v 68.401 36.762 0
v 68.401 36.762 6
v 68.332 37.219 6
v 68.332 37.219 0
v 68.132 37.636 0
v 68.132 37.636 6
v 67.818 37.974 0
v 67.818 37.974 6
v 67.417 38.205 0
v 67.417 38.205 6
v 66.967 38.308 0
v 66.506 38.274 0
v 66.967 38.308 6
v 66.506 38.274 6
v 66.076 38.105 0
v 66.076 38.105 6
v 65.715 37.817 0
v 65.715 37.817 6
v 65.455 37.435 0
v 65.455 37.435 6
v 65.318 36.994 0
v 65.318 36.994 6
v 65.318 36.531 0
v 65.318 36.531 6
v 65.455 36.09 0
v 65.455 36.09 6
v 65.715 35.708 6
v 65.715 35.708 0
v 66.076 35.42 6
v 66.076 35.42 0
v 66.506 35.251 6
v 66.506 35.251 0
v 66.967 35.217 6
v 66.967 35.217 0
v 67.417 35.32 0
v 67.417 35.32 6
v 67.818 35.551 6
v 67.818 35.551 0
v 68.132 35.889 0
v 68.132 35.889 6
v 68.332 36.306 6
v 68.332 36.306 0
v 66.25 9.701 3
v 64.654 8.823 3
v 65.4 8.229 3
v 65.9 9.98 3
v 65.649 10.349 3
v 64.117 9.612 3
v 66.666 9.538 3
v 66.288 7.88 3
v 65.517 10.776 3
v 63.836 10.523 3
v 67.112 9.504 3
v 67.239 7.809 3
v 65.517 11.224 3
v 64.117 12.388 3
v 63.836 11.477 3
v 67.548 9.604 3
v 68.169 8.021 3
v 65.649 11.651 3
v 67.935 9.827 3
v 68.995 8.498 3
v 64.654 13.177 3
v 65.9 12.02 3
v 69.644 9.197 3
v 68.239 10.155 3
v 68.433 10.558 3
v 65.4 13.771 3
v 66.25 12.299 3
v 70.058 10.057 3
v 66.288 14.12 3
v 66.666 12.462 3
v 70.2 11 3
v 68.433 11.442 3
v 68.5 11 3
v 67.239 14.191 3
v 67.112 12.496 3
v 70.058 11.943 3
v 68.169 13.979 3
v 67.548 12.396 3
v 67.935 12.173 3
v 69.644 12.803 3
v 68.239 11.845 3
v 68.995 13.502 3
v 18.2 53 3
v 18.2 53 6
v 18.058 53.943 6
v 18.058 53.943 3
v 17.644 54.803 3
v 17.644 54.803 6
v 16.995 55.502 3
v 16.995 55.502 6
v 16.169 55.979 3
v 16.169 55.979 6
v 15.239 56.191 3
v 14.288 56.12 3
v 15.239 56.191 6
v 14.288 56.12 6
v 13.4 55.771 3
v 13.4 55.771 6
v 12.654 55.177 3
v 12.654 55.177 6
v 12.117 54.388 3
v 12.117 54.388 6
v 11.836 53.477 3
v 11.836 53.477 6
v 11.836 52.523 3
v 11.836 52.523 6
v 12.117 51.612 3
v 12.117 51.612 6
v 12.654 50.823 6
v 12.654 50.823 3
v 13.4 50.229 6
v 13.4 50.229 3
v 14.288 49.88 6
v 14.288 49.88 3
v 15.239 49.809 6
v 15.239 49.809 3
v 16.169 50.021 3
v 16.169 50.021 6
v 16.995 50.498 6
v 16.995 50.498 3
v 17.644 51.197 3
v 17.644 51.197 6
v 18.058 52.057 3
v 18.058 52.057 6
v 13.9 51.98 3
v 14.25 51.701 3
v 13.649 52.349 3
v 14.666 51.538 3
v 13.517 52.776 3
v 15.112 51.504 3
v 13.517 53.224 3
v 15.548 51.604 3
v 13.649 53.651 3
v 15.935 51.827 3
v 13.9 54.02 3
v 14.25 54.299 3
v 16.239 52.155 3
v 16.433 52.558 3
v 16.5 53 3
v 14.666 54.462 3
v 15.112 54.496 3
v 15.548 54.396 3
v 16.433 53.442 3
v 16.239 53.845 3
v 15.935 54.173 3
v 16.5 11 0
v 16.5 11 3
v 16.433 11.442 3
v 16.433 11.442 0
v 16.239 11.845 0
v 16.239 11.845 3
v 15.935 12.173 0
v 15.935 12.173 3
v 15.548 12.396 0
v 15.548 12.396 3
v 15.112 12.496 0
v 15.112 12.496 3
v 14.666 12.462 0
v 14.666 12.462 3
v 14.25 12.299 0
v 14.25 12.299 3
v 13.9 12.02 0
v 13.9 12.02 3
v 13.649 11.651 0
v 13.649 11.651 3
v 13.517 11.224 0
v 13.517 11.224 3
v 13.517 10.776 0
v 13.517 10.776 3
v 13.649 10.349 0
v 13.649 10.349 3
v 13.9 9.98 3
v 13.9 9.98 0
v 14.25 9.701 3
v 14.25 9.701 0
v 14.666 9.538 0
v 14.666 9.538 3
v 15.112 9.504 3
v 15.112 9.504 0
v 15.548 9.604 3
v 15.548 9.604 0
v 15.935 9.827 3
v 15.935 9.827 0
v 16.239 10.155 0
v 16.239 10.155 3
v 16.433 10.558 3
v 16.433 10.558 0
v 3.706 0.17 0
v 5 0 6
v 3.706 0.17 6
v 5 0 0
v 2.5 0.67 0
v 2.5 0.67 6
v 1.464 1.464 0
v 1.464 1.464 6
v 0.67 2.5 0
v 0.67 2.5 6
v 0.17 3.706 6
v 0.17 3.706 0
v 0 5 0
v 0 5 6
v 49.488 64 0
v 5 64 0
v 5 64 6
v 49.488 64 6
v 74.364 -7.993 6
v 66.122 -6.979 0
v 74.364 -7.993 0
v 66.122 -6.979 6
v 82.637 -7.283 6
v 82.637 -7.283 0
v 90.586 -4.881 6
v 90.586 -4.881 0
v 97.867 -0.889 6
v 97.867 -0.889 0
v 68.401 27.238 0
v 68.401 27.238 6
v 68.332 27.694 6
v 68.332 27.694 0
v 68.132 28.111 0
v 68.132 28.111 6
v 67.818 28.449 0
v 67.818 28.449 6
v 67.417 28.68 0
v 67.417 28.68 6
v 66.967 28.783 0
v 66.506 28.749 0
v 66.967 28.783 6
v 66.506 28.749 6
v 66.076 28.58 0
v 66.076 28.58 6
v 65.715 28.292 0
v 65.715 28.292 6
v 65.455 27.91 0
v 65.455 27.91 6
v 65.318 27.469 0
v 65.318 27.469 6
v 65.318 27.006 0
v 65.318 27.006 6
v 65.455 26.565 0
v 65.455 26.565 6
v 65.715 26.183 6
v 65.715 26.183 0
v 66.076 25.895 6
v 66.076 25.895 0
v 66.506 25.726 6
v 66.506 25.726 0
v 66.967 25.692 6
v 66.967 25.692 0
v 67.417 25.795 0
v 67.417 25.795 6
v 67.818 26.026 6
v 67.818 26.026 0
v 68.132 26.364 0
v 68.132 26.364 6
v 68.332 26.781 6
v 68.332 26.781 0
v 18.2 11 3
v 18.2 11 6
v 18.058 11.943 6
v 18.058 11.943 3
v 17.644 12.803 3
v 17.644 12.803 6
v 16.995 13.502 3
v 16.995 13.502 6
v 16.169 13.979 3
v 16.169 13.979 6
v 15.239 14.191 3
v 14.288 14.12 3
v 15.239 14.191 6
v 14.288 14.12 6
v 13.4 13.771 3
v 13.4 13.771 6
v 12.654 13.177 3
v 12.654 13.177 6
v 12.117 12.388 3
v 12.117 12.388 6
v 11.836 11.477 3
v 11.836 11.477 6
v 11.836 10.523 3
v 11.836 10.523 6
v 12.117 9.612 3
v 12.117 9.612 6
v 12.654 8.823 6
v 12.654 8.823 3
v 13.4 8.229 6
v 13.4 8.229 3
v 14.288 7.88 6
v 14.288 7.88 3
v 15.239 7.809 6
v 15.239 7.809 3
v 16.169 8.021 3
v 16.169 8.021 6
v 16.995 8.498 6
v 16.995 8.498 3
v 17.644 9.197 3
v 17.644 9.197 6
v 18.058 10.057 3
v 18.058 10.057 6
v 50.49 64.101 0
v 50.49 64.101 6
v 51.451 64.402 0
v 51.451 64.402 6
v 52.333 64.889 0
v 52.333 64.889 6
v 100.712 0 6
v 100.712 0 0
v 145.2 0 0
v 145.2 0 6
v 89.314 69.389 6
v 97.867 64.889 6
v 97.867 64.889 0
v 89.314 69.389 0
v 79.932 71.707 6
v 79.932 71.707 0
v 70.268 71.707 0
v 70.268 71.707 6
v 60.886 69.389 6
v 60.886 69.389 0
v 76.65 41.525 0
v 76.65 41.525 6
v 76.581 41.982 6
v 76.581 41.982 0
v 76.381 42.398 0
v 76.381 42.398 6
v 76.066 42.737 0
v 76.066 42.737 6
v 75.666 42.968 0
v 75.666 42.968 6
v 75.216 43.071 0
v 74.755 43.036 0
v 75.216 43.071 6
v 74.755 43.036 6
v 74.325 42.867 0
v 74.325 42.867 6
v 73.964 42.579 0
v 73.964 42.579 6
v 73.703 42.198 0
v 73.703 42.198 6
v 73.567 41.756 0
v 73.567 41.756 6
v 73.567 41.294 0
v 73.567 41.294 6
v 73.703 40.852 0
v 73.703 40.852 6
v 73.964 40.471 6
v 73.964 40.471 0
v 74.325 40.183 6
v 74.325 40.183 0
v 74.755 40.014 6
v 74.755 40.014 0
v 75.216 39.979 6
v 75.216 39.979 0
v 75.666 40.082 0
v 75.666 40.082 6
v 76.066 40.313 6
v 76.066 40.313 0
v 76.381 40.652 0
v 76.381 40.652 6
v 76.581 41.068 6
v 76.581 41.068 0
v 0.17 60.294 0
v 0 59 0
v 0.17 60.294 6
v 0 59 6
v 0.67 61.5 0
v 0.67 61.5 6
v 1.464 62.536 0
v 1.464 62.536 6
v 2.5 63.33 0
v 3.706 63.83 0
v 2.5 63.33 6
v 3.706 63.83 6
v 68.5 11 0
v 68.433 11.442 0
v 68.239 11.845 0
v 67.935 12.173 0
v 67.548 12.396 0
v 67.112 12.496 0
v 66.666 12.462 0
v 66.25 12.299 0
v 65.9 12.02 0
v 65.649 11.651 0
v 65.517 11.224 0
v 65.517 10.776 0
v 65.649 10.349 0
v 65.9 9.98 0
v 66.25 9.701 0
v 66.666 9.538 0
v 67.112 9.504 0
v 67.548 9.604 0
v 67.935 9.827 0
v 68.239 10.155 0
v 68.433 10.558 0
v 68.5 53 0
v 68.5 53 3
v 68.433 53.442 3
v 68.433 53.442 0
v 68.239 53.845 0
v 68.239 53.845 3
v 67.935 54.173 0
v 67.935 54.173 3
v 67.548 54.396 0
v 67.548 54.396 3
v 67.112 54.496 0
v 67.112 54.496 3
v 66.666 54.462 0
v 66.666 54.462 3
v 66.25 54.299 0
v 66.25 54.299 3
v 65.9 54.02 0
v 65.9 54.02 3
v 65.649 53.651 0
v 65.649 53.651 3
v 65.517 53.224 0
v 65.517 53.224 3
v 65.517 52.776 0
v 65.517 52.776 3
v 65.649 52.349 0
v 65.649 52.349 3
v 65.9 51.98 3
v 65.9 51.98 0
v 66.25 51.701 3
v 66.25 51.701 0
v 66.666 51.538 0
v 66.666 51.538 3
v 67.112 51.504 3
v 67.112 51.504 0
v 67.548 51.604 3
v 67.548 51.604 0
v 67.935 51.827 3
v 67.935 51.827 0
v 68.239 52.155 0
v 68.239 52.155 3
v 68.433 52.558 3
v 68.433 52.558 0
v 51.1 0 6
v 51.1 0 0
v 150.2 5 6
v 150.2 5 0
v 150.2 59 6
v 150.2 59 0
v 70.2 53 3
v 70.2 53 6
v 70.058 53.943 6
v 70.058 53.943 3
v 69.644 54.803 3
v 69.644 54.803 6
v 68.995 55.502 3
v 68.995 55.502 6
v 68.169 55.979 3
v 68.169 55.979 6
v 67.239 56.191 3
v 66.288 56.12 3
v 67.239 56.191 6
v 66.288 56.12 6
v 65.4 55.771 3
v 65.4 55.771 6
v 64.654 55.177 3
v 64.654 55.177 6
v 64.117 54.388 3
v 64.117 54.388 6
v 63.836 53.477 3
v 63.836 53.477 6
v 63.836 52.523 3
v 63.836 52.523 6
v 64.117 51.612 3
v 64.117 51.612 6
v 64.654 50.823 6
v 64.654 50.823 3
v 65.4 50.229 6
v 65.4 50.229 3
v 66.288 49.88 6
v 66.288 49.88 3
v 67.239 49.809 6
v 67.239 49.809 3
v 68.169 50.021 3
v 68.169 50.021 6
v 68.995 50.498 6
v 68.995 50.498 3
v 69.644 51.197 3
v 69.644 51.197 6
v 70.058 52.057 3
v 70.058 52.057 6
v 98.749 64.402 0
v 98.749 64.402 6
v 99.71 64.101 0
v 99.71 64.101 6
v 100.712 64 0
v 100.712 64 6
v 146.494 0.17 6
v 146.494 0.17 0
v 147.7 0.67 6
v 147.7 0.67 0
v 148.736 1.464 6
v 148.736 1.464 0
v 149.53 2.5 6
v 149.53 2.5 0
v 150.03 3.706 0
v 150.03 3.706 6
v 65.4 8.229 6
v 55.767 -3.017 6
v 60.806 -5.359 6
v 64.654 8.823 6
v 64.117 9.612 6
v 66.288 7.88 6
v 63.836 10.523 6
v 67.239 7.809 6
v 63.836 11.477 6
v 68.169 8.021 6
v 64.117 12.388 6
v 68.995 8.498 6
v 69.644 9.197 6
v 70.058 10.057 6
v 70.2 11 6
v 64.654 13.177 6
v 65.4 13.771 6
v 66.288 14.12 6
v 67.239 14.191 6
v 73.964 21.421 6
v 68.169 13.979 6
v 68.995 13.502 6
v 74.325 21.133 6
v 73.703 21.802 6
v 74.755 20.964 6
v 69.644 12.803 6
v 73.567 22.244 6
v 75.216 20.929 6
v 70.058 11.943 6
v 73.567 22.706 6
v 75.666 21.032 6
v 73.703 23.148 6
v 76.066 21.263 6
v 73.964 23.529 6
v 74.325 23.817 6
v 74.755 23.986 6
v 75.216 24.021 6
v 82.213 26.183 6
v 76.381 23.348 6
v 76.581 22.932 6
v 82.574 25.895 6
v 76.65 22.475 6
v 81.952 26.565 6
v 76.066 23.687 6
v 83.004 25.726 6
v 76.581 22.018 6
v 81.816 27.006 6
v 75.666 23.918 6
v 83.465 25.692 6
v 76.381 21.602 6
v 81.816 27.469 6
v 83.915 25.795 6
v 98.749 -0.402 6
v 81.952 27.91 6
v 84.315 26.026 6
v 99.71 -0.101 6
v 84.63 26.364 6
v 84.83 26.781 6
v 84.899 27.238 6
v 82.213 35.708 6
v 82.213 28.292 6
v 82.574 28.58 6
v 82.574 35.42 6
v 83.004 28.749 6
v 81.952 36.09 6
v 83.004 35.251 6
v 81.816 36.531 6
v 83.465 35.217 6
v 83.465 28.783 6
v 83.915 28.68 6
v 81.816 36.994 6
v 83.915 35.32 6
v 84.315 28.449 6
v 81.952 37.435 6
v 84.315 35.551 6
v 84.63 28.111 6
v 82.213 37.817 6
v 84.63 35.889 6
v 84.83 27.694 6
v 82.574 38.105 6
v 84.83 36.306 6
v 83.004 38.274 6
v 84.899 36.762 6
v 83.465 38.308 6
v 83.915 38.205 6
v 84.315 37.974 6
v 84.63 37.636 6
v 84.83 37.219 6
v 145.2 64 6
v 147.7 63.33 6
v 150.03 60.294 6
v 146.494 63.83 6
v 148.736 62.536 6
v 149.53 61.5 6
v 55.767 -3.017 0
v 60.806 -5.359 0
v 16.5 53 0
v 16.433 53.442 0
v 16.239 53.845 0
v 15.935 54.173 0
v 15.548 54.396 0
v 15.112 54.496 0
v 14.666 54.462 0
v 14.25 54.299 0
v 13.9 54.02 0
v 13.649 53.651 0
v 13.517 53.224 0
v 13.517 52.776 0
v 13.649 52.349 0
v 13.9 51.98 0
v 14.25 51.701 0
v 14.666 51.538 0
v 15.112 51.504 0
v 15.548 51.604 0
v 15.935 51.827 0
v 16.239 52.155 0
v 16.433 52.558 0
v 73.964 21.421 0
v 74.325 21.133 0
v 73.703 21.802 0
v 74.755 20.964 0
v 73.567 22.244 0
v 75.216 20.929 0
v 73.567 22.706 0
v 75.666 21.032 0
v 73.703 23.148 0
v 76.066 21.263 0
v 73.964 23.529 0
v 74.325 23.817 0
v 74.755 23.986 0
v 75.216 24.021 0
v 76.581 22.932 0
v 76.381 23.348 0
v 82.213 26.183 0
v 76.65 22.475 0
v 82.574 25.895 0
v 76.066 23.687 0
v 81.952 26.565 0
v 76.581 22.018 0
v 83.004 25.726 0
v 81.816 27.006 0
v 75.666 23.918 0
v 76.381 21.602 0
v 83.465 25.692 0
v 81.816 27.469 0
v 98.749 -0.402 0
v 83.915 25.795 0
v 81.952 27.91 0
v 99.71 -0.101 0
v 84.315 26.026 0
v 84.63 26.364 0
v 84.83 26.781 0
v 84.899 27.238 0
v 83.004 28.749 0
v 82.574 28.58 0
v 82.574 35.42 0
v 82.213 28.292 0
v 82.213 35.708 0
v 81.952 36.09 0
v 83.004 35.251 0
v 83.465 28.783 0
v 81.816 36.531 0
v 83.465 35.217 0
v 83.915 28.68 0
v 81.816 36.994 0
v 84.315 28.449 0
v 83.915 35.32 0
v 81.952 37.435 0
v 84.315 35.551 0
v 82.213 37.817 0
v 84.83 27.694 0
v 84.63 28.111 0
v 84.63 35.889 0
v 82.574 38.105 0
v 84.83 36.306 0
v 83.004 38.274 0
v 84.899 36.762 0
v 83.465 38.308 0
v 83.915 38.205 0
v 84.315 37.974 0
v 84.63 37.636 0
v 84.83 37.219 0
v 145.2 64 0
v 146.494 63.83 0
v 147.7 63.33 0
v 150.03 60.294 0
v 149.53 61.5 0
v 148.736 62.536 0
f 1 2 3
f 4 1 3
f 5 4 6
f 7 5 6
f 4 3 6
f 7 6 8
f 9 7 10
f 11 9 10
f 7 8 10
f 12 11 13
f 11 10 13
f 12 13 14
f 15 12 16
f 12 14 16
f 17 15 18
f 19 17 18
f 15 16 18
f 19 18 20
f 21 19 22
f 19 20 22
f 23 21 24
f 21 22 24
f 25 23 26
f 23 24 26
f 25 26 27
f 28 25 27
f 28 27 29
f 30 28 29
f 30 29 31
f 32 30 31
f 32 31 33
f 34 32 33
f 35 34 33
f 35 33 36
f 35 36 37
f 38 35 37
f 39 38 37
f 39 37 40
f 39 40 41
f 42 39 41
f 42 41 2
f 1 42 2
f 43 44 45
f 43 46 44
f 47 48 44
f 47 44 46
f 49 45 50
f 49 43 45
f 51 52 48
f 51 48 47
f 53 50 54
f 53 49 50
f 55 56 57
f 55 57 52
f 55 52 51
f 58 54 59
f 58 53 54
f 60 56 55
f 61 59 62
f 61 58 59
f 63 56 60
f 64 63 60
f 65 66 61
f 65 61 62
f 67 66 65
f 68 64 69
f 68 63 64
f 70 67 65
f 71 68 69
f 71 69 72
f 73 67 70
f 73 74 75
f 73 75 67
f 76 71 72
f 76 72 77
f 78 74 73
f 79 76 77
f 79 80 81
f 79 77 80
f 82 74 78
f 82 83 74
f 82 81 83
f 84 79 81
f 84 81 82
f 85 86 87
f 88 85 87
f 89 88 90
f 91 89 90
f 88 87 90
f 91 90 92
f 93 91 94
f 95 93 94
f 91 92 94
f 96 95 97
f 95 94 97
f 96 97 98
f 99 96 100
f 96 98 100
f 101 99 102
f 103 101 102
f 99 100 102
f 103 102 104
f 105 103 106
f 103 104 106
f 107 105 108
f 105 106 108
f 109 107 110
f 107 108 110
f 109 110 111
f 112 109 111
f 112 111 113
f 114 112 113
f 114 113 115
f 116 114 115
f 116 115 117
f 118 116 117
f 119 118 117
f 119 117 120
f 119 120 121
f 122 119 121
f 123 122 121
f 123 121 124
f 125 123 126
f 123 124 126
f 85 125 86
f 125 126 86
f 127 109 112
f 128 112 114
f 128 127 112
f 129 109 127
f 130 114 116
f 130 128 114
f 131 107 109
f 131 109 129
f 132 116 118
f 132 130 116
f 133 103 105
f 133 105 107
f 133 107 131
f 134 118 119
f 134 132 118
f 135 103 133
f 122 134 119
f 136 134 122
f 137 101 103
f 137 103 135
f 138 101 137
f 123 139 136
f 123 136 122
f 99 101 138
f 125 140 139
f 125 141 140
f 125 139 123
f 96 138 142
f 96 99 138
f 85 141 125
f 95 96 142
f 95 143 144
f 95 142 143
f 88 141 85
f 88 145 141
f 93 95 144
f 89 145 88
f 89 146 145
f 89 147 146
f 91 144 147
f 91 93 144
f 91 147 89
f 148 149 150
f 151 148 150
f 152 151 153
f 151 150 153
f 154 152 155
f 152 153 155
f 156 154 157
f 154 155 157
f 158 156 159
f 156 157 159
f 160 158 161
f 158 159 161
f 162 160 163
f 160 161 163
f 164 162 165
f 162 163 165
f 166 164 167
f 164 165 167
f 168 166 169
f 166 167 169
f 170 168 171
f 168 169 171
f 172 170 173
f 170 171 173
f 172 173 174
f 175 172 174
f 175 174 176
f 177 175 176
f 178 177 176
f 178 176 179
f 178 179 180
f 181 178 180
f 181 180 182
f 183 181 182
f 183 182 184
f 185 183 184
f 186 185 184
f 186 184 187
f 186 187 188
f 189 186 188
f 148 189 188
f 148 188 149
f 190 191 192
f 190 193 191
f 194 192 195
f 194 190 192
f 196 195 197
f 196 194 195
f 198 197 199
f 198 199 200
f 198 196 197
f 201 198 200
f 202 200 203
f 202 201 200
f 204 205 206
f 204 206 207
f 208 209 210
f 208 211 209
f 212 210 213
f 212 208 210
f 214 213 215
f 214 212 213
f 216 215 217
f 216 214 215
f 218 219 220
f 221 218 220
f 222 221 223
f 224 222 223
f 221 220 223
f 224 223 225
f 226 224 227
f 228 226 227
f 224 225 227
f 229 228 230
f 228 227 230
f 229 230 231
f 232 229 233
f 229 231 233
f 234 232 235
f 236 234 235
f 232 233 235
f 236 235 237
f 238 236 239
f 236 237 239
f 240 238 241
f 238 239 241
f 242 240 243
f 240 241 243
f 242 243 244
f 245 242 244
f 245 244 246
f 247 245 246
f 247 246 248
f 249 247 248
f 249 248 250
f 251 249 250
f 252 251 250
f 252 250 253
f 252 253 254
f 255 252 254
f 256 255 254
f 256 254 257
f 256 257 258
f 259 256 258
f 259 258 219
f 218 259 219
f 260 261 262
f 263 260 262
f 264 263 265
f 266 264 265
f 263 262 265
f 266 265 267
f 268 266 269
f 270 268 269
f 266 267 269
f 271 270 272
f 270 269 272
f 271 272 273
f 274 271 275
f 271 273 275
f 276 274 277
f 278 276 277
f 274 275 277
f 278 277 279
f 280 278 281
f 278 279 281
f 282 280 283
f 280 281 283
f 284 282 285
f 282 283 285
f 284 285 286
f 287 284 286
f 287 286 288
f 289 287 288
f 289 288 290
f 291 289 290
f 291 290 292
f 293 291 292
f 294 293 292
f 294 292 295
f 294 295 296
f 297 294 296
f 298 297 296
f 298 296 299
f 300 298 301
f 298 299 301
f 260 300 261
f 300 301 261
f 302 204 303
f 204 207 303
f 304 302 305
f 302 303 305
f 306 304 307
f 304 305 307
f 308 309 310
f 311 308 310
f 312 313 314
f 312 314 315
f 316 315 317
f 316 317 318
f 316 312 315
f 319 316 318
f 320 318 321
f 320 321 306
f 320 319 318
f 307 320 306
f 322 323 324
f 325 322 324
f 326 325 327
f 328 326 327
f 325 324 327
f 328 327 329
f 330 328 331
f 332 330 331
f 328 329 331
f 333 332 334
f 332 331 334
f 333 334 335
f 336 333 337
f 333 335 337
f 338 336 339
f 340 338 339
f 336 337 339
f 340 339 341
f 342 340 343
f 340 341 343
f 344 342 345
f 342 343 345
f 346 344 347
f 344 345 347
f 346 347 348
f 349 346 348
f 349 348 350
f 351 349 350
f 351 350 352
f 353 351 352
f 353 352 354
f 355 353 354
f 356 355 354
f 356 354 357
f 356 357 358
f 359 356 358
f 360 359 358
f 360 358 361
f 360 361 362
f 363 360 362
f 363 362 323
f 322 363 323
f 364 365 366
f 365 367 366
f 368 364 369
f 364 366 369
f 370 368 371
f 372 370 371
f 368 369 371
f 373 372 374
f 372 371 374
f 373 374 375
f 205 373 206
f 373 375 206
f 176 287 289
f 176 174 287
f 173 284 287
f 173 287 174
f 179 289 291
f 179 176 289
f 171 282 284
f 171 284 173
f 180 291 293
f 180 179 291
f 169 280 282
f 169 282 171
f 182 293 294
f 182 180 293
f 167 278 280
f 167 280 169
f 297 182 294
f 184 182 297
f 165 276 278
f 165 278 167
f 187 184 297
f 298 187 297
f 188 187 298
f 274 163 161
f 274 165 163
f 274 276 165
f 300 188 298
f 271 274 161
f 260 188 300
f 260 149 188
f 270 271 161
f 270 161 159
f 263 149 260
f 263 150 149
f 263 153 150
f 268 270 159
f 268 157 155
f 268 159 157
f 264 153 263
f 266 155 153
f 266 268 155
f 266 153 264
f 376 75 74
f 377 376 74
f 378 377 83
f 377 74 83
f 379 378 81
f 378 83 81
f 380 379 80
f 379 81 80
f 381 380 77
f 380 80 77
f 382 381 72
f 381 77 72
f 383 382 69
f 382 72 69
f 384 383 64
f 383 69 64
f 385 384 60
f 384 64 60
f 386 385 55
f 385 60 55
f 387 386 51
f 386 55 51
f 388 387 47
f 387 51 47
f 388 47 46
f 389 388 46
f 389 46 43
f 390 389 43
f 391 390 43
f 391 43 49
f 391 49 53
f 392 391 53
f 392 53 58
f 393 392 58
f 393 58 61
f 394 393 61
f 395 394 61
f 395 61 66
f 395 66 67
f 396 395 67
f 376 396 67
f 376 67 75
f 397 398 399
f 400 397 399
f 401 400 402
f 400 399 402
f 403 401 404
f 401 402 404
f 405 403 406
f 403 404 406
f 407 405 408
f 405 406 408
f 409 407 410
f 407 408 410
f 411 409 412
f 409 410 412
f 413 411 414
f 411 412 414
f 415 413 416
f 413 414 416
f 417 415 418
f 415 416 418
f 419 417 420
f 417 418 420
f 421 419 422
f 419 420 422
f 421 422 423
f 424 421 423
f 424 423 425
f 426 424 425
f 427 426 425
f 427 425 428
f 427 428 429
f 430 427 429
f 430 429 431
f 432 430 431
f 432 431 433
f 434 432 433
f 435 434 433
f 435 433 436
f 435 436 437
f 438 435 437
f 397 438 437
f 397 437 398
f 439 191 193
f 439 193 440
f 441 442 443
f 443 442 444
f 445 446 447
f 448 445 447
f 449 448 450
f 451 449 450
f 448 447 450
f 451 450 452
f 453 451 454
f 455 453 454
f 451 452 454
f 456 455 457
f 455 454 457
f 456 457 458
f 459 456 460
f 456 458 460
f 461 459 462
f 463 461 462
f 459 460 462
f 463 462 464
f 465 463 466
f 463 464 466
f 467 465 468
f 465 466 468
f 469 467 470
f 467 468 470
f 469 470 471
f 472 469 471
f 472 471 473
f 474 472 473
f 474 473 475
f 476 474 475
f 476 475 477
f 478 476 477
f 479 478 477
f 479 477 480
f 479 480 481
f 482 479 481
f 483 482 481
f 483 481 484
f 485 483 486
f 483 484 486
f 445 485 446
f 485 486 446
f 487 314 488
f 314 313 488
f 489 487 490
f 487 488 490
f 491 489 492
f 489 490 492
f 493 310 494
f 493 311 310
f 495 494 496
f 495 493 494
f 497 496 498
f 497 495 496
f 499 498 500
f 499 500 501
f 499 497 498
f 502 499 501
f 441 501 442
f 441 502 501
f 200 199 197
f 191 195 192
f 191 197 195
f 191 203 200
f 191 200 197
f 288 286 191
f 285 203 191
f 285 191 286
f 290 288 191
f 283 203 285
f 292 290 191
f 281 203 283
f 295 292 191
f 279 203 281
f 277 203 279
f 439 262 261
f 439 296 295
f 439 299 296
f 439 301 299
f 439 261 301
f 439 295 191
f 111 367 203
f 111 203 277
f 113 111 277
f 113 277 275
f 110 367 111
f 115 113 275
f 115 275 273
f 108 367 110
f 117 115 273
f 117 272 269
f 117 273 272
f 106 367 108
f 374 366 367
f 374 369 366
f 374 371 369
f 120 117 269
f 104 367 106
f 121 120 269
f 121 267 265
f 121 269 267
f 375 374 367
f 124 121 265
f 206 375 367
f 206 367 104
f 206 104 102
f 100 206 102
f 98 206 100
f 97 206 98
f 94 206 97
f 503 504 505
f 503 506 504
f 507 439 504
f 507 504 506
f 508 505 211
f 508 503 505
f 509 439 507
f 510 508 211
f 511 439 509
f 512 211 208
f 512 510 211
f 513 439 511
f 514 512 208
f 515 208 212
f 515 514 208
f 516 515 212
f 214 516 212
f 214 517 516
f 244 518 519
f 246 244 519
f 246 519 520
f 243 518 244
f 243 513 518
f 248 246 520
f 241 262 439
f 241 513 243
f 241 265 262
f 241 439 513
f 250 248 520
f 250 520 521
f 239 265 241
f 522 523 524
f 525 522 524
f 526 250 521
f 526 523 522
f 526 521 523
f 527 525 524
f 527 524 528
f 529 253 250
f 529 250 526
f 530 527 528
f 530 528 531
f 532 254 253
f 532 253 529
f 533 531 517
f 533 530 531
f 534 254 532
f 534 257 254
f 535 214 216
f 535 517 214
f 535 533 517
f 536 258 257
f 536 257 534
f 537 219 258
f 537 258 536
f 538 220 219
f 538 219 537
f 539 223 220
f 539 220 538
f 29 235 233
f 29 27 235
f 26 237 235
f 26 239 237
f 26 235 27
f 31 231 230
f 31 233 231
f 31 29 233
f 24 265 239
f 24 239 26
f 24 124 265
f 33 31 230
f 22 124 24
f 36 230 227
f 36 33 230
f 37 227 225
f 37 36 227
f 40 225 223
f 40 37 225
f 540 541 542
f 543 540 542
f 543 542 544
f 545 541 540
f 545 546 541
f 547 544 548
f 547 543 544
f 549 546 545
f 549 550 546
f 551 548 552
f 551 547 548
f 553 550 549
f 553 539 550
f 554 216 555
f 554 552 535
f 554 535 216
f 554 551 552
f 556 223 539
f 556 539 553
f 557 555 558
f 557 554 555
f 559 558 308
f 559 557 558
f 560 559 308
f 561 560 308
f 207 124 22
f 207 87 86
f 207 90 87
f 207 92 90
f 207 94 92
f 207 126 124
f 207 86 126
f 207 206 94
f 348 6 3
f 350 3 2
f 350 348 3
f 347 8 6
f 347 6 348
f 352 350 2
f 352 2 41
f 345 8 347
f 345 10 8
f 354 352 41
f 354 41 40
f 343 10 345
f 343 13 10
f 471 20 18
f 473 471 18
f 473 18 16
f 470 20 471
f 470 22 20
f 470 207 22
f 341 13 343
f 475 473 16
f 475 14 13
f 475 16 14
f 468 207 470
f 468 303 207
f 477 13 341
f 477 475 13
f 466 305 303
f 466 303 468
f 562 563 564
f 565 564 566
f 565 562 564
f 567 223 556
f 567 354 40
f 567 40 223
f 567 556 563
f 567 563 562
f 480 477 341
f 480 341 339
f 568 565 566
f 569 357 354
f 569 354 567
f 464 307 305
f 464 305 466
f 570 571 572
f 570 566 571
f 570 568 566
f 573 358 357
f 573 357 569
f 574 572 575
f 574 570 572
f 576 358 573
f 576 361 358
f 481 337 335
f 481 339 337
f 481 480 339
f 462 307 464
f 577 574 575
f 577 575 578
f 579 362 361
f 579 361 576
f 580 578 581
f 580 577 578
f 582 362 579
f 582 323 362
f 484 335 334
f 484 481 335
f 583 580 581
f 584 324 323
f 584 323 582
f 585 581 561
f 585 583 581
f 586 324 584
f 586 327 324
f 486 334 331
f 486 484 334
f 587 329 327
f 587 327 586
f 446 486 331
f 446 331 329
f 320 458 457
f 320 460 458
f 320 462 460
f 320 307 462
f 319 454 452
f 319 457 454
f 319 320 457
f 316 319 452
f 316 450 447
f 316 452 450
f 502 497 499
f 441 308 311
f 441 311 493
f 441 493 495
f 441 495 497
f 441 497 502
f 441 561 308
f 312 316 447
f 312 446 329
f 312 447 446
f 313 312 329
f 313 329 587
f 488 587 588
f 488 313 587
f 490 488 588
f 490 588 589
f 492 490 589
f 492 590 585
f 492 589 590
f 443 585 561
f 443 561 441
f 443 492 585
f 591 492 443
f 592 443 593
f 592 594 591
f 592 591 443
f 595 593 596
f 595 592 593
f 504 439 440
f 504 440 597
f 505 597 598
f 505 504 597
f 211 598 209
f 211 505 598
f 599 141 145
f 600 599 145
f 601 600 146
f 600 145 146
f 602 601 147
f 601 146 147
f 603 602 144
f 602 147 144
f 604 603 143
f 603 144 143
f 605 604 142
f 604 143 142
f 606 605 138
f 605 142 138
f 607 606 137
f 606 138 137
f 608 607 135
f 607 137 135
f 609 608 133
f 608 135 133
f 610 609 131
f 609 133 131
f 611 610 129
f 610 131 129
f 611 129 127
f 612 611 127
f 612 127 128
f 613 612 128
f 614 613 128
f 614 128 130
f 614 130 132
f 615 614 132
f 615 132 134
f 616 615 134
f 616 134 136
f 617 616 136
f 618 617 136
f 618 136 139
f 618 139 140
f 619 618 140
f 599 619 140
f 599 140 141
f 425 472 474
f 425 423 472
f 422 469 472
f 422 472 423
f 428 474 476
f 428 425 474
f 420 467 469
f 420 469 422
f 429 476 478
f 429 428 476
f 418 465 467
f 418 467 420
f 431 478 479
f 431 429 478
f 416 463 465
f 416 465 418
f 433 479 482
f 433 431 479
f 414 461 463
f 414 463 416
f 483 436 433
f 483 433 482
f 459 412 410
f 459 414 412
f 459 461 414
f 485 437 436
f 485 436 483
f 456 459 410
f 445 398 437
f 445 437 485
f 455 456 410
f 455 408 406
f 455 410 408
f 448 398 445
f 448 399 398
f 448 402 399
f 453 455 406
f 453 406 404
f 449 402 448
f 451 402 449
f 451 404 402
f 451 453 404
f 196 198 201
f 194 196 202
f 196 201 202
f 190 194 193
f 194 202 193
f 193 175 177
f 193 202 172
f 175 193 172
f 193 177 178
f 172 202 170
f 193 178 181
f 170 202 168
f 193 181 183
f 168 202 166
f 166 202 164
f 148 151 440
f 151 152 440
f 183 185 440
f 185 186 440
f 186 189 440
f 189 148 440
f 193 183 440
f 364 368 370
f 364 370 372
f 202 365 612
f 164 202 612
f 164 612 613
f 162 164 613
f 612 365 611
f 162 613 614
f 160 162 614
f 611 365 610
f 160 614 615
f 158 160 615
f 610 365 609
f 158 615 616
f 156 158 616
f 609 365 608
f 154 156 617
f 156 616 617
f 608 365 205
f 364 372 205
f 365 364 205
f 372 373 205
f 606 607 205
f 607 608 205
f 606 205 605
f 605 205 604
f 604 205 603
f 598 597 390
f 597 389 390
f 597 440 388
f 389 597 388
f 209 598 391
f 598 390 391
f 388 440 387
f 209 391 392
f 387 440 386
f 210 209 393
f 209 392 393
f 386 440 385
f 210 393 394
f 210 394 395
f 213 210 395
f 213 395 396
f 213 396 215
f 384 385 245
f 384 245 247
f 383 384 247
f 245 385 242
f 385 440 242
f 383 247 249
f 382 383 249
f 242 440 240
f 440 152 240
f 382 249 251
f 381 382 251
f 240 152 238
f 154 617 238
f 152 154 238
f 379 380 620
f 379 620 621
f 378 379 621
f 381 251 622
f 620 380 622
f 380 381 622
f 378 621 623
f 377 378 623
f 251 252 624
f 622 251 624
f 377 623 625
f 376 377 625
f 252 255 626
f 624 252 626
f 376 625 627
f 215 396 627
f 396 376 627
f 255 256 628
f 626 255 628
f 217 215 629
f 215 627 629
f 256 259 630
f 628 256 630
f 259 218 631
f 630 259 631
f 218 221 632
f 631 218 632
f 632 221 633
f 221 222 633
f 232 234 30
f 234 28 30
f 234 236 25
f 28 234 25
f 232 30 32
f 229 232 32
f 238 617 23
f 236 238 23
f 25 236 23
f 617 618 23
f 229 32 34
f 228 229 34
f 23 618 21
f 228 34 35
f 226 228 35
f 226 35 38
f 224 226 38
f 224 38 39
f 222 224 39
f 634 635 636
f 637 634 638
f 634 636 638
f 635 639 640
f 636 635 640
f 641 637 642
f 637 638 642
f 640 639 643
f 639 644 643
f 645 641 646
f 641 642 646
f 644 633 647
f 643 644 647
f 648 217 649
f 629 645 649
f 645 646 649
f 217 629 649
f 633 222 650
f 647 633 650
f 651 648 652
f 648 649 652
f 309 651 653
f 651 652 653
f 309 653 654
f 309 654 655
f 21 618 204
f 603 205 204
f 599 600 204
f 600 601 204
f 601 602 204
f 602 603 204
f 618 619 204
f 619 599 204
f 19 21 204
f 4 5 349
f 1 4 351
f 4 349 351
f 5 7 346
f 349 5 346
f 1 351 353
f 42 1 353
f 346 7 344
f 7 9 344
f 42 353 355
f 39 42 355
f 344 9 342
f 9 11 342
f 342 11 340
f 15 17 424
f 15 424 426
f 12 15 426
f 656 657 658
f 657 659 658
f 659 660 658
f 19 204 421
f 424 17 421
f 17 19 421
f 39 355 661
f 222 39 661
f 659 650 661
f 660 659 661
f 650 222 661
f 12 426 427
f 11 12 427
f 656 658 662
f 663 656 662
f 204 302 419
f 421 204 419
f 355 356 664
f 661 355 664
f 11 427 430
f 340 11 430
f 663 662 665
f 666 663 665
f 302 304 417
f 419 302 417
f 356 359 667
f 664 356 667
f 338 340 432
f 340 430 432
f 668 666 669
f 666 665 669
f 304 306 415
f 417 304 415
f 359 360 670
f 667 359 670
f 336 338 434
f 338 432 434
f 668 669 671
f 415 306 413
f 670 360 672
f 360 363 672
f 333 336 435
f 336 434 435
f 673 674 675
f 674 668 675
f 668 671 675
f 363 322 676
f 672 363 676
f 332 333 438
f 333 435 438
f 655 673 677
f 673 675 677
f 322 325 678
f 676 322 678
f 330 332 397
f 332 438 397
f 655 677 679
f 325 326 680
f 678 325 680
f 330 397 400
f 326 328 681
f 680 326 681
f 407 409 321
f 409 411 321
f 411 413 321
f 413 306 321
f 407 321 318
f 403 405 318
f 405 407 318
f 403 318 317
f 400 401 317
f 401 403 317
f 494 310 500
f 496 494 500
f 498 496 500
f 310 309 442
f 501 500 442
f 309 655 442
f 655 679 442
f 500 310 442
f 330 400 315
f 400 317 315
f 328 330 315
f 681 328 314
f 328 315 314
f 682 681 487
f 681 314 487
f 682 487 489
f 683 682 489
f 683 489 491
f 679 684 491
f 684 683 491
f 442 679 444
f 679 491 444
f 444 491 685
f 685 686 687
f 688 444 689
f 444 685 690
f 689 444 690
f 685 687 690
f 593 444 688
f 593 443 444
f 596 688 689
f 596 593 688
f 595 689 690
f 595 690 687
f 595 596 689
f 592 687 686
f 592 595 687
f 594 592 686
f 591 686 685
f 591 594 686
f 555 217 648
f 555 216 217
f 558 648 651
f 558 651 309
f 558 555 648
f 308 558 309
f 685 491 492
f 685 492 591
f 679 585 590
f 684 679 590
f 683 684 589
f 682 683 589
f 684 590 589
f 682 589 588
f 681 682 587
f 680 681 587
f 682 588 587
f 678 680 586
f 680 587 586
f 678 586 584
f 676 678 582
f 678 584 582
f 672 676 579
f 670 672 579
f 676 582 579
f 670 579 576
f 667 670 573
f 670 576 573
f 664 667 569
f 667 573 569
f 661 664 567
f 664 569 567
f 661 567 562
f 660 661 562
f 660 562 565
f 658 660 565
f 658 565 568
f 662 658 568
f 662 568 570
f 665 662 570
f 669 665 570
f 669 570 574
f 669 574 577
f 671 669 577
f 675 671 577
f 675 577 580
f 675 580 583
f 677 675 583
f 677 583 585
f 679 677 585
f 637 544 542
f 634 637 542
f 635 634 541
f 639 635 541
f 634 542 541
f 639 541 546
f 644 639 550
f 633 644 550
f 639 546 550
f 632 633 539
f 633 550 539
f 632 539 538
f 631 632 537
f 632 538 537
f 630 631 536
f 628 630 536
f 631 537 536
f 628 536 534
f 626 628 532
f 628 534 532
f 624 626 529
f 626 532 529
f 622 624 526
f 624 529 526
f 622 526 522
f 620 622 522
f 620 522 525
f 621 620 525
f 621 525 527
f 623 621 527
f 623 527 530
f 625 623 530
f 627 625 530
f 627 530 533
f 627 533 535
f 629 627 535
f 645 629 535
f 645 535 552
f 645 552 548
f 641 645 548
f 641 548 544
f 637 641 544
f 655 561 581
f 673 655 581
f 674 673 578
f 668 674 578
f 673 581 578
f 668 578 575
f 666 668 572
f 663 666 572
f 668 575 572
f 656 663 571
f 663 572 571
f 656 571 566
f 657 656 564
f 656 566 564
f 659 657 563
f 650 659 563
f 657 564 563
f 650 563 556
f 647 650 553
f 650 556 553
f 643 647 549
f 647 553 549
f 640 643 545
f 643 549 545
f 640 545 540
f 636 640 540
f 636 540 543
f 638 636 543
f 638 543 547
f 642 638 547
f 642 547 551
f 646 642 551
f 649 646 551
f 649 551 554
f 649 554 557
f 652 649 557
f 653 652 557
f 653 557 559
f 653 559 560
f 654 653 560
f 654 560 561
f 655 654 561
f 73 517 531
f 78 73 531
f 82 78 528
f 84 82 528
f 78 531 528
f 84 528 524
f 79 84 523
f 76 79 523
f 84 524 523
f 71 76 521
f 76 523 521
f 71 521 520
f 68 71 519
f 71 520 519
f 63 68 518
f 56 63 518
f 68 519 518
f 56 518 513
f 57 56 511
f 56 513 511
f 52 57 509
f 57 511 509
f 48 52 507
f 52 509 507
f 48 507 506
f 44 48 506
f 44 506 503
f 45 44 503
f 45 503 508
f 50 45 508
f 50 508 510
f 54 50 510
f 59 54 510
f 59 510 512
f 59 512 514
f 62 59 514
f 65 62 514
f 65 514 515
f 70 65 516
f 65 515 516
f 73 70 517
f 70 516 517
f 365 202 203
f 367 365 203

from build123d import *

# Parameters (mm, degrees)
SKETCH1_W                = 150.2
SKETCH1_H                = 64
BOSS_EXTRUDE1_DEPTH      = 6
FILLET1_R                = 5
BOSS_EXTRUDE2_DEPTH      = 40
BOSS_EXTRUDE2_DEPTH_BACK = 10
SKETCH2_W                = 60
SKETCH2_H                = 6
FILLET2_R                = 5
SKETCH3_R                = 40
BOSS_EXTRUDE4_DEPTH      = 6
FILLET4_R                = 5
SKETCH4_R                = 1.55
CUT_EXTRUDE1_DEPTH       = 167.673453195
CUT_EXTRUDE2_START       = -10
CUT_EXTRUDE2_DEPTH       = 10
FILLET5_R                = 5
SKETCH6_R                = 1.5
CUT_EXTRUDE3_DEPTH       = 167.673453195
SKETCH7_R                = 1.5
CUT_EXTRUDE4_DEPTH       = 167.673453195
SKETCH9_R                = 3.2
CUT_EXTRUDE5_DEPTH       = 3


with BuildPart() as part:
    # Sketch1 → Boss-Extrude1 (new body)
    with BuildSketch(Plane.XY):
        with Locations((75.1, 32)):
            Rectangle(SKETCH1_W, SKETCH1_H)
    extrude(amount=BOSS_EXTRUDE1_DEPTH)

    # Fillet1
    fillet1_edges = [part.edges().sort_by_distance(p)[0] for p in [
        (0, 64, 3),
        (150.2, 64, 3),
        (150.2, 0, 3),
        (0, 0, 3),
    ]]
    fillet(fillet1_edges, radius=FILLET1_R)

    # Sketch2 → Boss-Extrude2 (add, two sides: drawn at the far end of the back side and taken through both)
    with BuildSketch(Plane.XZ.offset(-BOSS_EXTRUDE2_DEPTH_BACK)):
        with Locations((30, 3)):
            Rectangle(SKETCH2_W, SKETCH2_H)
    extrude(amount=BOSS_EXTRUDE2_DEPTH + BOSS_EXTRUDE2_DEPTH_BACK)

    # Fillet2
    fillet2_edges = [part.edges().sort_by_distance(p)[0] for p in [
        (0, -40, 3),
        (60, -40, 3),
    ]]
    fillet(fillet2_edges, radius=FILLET2_R)

    # Sketch3 → Boss-Extrude4 (add)
    with BuildSketch(Plane.XY.offset(6)):
        with Locations((75.1, 32)):
            Circle(SKETCH3_R)
    extrude(amount=-BOSS_EXTRUDE4_DEPTH)

    # Fillet4
    fillet4_edges = [part.edges().sort_by_distance(p)[0] for p in [
        (60, -5.040383367, 3),
        (99.1, 0, 3),
        (99.1, 64, 3),
        (51.1, 64, 3),
    ]]
    fillet(fillet4_edges, radius=FILLET4_R)

    # Sketch4 → Cut-Extrude1 (cut, through all)
    with BuildSketch(Plane.XY.offset(6)):
        with Locations((75.1, 41.525)):
            Circle(SKETCH4_R)
        with Locations((83.348891971, 36.7625)):
            Circle(SKETCH4_R)
        with Locations((83.348891971, 27.2375)):
            Circle(SKETCH4_R)
        with Locations((75.1, 22.475)):
            Circle(SKETCH4_R)
        with Locations((66.851108029, 27.2375)):
            Circle(SKETCH4_R)
        with Locations((66.851108029, 36.7625)):
            Circle(SKETCH4_R)
    extrude(amount=-CUT_EXTRUDE1_DEPTH, mode=Mode.SUBTRACT)

    # Sketch5 → Cut-Extrude2 (cut)
    with BuildSketch(Plane(origin=(0, 0, 0), x_dir=(-1, 0, 0), z_dir=(0, 0, -1)).offset(CUT_EXTRUDE2_START)):
        with BuildLine():
            Line((0, 0), (-51.1, 0))
            ThreePointArc((-51.1, 0), (-58.245869166, -4.275863516), (-66.122222222, -6.979475448))
            ThreePointArc((-66.122222222, -6.979475448), (-61.886409718, -7.939678347), (-60, -11.851909879))
            Line((-60, -11.851909879), (-60, -35))
            ThreePointArc((-60, -35), (-58.535533906, -38.535533906), (-55, -40))
            Line((-55, -40), (-5, -40))
            ThreePointArc((-5, -40), (-1.464466094, -38.535533906), (0, -35))
            Line((0, -35), (0, 0))
        make_face()
    extrude(amount=CUT_EXTRUDE2_DEPTH, mode=Mode.SUBTRACT)

    # Fillet5
    fillet5_edges = [part.edges().sort_by_distance(p)[0] for p in [
        (0, 0, 3),
    ]]
    fillet(fillet5_edges, radius=FILLET5_R)

    # Sketch6 → Cut-Extrude3 (cut, through all)
    with BuildSketch(Plane.XY.offset(6)):
        with Locations((15, 11)):
            Circle(SKETCH6_R)
        with Locations((15, 53)):
            Circle(SKETCH6_R)
    extrude(amount=-CUT_EXTRUDE3_DEPTH, mode=Mode.SUBTRACT)

    # Sketch7 → Cut-Extrude4 (cut, through all)
    with BuildSketch(Plane.XY.offset(6)):
        with Locations((67, 53)):
            Circle(SKETCH7_R)
        with Locations((67, 11)):
            Circle(SKETCH7_R)
    extrude(amount=-CUT_EXTRUDE4_DEPTH, mode=Mode.SUBTRACT)

    # Sketch9 → Cut-Extrude5 (cut)
    with BuildSketch(Plane.XY.offset(6)):
        with Locations((15, 53)):
            Circle(SKETCH9_R)
        with Locations((67, 53)):
            Circle(SKETCH9_R)
        with Locations((15, 11)):
            Circle(SKETCH9_R)
        with Locations((67, 11)):
            Circle(SKETCH9_R)
    extrude(amount=-CUT_EXTRUDE5_DEPTH, mode=Mode.SUBTRACT)


solid = part.part
